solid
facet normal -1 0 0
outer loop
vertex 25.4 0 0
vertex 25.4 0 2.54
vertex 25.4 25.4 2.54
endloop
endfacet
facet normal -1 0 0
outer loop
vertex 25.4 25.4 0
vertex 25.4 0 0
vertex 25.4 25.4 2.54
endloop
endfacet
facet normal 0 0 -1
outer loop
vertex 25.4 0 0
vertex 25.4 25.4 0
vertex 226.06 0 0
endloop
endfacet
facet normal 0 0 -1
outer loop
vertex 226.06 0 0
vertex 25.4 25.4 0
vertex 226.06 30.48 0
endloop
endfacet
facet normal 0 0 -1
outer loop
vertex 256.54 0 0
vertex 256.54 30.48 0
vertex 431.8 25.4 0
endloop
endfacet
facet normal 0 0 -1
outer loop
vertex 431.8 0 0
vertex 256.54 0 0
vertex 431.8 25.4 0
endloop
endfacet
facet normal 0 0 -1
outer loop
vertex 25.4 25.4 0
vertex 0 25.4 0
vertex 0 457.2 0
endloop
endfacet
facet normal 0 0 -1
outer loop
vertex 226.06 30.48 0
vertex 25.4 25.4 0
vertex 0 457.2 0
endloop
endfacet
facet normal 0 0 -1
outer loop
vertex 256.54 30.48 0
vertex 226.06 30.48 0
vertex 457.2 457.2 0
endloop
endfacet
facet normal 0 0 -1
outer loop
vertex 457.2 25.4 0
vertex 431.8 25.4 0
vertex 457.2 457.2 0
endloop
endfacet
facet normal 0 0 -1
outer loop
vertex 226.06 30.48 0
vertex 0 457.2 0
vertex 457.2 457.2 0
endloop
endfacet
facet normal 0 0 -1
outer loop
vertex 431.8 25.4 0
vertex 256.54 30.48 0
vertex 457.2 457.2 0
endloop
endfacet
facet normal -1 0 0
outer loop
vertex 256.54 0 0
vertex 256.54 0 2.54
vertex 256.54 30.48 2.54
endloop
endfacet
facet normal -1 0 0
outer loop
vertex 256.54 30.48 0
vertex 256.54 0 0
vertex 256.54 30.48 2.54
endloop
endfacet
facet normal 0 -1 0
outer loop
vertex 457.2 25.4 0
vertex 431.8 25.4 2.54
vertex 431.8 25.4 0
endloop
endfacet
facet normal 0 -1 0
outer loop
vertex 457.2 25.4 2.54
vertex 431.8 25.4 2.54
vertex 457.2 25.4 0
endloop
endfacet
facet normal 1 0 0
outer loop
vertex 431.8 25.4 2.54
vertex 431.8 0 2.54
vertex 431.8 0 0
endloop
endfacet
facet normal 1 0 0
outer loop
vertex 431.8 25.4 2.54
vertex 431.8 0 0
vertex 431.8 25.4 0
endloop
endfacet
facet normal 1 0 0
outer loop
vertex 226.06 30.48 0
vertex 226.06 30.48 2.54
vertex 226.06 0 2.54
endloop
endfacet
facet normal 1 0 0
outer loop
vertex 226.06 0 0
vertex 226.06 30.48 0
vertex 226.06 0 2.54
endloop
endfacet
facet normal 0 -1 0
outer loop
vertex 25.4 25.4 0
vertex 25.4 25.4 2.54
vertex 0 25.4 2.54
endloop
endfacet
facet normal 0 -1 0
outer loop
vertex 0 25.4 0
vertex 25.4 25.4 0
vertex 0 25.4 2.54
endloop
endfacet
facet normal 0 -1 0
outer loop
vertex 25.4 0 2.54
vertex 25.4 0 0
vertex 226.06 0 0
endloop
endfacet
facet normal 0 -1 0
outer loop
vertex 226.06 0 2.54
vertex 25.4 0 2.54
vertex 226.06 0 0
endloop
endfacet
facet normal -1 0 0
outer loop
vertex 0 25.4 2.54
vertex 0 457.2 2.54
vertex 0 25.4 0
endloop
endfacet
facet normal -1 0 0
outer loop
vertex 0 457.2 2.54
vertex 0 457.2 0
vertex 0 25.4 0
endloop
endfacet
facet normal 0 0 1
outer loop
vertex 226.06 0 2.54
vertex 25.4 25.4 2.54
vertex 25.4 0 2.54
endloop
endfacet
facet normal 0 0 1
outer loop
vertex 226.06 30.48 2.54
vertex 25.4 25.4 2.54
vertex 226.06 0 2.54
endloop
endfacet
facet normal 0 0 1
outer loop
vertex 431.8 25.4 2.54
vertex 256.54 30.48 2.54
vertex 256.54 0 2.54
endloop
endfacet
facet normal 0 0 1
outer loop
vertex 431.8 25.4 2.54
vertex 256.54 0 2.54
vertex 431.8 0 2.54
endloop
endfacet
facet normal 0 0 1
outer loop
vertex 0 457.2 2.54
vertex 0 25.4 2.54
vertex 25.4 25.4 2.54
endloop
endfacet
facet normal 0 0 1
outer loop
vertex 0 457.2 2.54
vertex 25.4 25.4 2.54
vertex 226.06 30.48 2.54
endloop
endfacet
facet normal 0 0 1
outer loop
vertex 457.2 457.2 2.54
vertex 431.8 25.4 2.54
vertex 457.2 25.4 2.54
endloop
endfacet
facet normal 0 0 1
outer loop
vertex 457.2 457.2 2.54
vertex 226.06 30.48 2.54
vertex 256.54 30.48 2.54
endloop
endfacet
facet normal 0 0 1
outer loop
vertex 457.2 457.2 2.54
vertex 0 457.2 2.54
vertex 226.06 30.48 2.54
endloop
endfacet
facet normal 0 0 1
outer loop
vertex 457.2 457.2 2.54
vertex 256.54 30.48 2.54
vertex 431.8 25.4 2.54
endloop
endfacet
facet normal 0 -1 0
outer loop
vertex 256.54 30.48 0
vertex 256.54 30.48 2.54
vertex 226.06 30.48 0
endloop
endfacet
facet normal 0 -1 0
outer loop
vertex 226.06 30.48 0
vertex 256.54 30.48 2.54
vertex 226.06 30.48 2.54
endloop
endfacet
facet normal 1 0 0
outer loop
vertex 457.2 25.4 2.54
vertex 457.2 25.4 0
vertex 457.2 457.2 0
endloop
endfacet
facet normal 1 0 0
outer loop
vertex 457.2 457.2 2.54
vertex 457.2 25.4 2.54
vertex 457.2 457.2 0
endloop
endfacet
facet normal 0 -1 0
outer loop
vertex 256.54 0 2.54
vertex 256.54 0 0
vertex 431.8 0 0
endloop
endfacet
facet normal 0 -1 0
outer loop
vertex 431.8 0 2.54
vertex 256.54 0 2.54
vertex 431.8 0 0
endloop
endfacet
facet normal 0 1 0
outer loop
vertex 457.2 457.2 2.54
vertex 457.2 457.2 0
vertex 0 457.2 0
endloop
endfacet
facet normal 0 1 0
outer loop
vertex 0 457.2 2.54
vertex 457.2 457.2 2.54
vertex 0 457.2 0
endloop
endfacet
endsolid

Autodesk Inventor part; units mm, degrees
ref_plane "YZ Plane" through (0, 0, 0) normal (1, 0, 0) x (0, 1, 0)
ref_plane "XZ Plane" through (0, 0, 0) normal (0, 1, 0) x (-1, 0, 0)
ref_plane "XY Plane" through (0, 0, 0) normal (0, 0, 1) x (1, 0, 0)
sketch "Sketch1" plane through (0, 0, 0) normal (0, 0, 1) x (1, 0, 0)
  line L0 (0, 0) -> (457.2, 0)
  line L1 (457.2, 0) -> (457.2, 457.2)
  line L2 (457.2, 457.2) -> (0, 457.2)
  line L3 (0, 457.2) -> (0, 0)
  dimension "d0" = 457.2
  dimension "d1" = 457.2
extrude "Extrusion1" add sketch "Sketch1" along normal blind 2.54
sketch "Sketch2" plane through (0, 0, 2.54) normal (0, 0, 1) x (1, 0, 0)
  line L0 (0, 0) -> (457.2, 0) projected
  line L1 (0, 0) -> (25.4, 0)
  line L2 (25.4, 0) -> (25.4, 25.4)
  line L3 (25.4, 25.4) -> (0, 25.4)
  line L4 (0, 25.4) -> (0, 0)
  line L5 (457.2, 0) -> (431.8, 0)
  line L6 (431.8, 0) -> (431.8, 25.4)
  line L7 (431.8, 25.4) -> (457.2, 25.4)
  line L8 (457.2, 25.4) -> (457.2, 0)
  dimension "d4" = 25.4
  dimension "d5" = 25.4
  dimension "d6" = 25.4
  dimension "d7" = 25.4
extrude "Extrusion2" cut sketch "Sketch2" against normal blind 25.4
sketch "Sketch3" plane through (0, 0, 2.54) normal (0, 0, 1) x (1, 0, 0)
  line L0 (226.06, 0) -> (256.54, 0)
  line L1 (256.54, 0) -> (256.54, 30.48)
  line L2 (256.54, 30.48) -> (226.06, 30.48)
  line L3 (226.06, 30.48) -> (226.06, 0)
  line L4 (25.4, 0) -> (431.8, 0) projected
  line L5 (25.4, 25.4) -> (25.4, 0) projected
  line L6 (431.8, 0) -> (431.8, 25.4) projected
  point P0 (0, 0)
  dimension "d10" = 30.48
  dimension "d11" = 30.48
  dimension "d12" = 0
  dimension "d16" = 175.26
extrude "Extrusion3" cut sketch "Sketch3" against normal blind 25.4
properties part number "Circuit Board" material "Glass"
